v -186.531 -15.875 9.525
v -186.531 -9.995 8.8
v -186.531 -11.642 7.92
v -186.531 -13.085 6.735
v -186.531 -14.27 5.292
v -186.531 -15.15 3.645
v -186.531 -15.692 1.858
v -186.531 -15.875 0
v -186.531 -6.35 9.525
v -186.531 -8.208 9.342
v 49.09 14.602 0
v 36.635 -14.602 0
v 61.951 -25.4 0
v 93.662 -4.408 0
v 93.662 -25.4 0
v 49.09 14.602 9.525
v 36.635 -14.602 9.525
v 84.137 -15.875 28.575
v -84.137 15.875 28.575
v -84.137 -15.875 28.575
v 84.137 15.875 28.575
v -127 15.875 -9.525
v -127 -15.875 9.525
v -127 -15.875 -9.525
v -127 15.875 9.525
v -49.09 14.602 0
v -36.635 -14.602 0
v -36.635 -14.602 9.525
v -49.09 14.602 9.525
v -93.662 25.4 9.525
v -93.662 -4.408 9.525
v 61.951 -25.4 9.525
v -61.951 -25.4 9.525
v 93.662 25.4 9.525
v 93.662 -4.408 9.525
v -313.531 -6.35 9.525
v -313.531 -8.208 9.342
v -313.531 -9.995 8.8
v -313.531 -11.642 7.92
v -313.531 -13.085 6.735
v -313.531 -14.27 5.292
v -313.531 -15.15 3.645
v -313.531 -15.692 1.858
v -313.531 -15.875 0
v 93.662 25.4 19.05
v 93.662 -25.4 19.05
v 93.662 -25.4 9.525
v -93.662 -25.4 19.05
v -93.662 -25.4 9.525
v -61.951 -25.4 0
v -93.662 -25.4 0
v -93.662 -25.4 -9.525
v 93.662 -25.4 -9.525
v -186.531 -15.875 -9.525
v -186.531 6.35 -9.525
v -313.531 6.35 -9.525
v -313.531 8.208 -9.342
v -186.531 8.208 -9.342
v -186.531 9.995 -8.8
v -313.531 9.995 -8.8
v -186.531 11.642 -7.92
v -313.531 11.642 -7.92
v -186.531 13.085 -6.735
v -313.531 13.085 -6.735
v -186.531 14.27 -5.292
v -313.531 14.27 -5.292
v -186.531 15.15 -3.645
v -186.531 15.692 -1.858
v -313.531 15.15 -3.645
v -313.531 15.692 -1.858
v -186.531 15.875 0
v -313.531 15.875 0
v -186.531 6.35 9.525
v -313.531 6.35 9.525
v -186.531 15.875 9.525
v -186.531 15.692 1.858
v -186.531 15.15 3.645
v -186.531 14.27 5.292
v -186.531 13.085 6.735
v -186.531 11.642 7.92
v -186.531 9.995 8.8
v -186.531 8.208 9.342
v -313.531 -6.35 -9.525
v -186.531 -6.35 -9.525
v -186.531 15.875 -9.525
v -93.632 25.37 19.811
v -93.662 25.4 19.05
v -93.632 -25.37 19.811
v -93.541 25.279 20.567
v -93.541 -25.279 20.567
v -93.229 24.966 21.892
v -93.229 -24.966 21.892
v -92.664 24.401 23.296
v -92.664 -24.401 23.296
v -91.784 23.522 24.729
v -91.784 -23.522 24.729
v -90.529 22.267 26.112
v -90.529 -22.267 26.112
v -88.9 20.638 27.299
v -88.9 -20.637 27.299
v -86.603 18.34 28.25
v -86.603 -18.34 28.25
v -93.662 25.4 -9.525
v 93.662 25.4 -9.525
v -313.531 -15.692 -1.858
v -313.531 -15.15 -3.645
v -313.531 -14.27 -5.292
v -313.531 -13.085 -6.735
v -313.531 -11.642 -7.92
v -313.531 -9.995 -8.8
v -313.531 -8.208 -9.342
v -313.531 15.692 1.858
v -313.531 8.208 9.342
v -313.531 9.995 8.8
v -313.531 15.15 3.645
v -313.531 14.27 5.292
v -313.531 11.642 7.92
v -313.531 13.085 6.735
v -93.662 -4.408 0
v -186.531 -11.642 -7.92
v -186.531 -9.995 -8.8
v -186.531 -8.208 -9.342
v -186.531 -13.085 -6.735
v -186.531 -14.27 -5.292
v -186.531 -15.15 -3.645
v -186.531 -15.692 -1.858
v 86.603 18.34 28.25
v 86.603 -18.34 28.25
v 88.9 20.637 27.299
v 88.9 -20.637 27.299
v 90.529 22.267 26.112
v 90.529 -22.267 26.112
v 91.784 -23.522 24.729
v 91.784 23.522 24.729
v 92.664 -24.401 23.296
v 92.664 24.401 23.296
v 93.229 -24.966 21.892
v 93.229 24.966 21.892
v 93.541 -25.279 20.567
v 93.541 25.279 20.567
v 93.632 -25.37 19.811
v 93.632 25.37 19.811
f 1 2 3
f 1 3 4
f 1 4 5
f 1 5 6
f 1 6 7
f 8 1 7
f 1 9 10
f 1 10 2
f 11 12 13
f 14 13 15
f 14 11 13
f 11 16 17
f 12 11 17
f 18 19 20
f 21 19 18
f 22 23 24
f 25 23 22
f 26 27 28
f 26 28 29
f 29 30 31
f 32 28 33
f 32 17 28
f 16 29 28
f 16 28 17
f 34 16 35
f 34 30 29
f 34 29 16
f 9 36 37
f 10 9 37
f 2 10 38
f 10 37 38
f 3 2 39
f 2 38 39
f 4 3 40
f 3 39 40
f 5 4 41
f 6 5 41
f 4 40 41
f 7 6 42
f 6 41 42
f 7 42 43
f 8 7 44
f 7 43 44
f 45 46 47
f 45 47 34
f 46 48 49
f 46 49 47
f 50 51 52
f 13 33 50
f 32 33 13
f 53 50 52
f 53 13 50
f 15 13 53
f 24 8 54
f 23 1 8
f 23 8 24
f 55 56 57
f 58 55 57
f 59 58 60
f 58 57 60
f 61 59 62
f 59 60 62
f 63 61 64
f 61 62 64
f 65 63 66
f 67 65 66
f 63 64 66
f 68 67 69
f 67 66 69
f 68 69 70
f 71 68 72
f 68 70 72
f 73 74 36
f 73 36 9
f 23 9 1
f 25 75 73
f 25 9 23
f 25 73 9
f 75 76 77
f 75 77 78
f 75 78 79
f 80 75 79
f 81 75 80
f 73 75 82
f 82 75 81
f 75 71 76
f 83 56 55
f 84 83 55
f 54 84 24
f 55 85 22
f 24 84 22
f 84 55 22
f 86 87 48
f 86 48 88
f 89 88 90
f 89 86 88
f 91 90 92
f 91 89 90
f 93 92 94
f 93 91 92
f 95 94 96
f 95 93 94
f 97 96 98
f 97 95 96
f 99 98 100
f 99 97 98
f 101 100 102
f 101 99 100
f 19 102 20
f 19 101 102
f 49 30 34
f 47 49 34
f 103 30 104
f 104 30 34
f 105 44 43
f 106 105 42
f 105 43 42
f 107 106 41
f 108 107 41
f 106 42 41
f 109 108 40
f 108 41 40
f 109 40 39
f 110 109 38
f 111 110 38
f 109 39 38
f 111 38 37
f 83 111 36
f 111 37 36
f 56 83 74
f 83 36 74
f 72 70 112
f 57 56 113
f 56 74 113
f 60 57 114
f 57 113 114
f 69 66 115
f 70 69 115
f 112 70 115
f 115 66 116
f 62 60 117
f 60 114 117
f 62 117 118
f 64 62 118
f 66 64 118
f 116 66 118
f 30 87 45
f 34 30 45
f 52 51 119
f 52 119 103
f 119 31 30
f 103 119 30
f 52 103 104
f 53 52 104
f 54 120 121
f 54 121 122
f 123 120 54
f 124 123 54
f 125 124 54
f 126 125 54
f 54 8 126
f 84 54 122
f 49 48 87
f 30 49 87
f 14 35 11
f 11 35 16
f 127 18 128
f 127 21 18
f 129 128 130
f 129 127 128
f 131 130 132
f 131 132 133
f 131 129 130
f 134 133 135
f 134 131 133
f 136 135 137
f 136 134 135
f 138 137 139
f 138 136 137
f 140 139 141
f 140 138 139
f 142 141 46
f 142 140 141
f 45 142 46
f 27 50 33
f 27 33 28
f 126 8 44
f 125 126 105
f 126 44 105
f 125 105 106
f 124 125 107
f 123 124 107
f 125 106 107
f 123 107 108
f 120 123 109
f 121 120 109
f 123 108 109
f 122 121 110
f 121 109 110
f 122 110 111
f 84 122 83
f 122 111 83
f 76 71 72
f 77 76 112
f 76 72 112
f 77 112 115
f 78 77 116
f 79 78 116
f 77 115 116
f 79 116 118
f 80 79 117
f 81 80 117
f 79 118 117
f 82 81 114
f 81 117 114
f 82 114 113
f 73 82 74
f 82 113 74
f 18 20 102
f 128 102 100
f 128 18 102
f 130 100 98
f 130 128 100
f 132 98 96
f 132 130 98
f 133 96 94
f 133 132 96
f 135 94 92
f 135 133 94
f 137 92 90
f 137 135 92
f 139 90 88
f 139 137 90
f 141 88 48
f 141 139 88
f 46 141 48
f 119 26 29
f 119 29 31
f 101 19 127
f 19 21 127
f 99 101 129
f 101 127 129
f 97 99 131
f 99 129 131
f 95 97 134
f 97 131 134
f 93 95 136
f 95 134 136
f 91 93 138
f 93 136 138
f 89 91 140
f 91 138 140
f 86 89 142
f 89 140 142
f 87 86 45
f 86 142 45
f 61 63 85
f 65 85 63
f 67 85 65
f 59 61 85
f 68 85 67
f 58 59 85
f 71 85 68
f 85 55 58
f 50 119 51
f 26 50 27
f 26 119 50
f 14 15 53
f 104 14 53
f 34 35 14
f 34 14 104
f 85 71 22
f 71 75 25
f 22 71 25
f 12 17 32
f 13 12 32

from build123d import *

# Parameters (mm, degrees)
F0_W     = 187.325
F0_H     = 50.8
F1_DEPTH = 9.525
F3_R     = 9.525
F4_W     = 186.53125
F4_H     = 31.75
F5_DEPTH = 9.525
F7_DEPTH = 127
F9_DEPTH = 9.525


with BuildPart() as f1:
    # F0 (on Top) → F1 (new body, symmetric)
    with BuildSketch(Plane.XY):
        Rectangle(F0_W, F0_H)
    extrude(amount=F1_DEPTH, both=True)


with BuildPart() as f2_1:
    # F2: copy of F1
    add(f1.part.moved(Location((0, 0, 19.05))))

    # F3
    f3_edges = [f2_1.edges().sort_by_distance(p)[0] for p in [
        (0, -25.4, 28.575),
        (93.6625, 0, 28.575),
        (0, 25.4, 28.575),
        (-93.6625, 0, 28.575),
    ]]
    fillet(f3_edges, radius=F3_R)


with BuildPart() as f5:
    # F4 (on Top) → F5 (new body, symmetric)
    with BuildSketch(Plane.XY):
        with Locations((-220.265625, 0)):
            Rectangle(F4_W, F4_H)
    extrude(amount=F5_DEPTH, both=True)

    # F6 (on face) → F7 (cut)
    with BuildSketch(Plane(origin=(-313.53125, 0, 0), x_dir=(0, -1, 0), z_dir=(-1, 0, 0))):
        with BuildLine():
            ThreePointArc((-6.35, -9.525), (-13.0851920908, -6.7351920908), (-15.875, 0))
            Line((-15.875, 0), (-15.875, -9.525))
            Line((-15.875, -9.525), (-6.35, -9.525))
        make_face()
        with BuildLine():
            ThreePointArc((-15.875, 0), (-13.0851920908, 6.7351920908), (-6.35, 9.525))
            Line((-6.35, 9.525), (-15.875, 9.525))
            Line((-15.875, 9.525), (-15.875, 0))
        make_face()
        with BuildLine():
            Line((15.875, -9.525), (15.875, 0))
            ThreePointArc((15.875, 0), (13.0851920908, -6.7351920908), (6.35, -9.525))
            Line((6.35, -9.525), (15.875, -9.525))
        make_face()
        with BuildLine():
            ThreePointArc((6.35, 9.525), (13.0851920908, 6.7351920908), (15.875, 0))
            Line((15.875, 0), (15.875, 9.525))
            Line((15.875, 9.525), (6.35, 9.525))
        make_face()
    extrude(amount=-F7_DEPTH, mode=Mode.SUBTRACT)


with BuildPart() as f1_1:
    add(f1.part)

    # F8 (on face) → F9 (cut, symmetric)
    with BuildSketch(Plane.XY.offset(9.525)):
        Polygon((-93.6625, -4.4079467915), (-93.6625, -25.4), (-61.9510543443, -25.4), (-36.6345102841, -14.6023206751), (-49.0904897159, 14.6023206751), align=None)
        Polygon((49.0904897159, 14.6023206751), (36.6345102841, -14.6023206751), (61.9510543443, -25.4), (93.6625, -25.4), (93.6625, -4.4079467915), align=None)
    extrude(amount=F9_DEPTH, both=True, mode=Mode.SUBTRACT)


solid = Compound([f2_1.part, f5.part, f1_1.part])
